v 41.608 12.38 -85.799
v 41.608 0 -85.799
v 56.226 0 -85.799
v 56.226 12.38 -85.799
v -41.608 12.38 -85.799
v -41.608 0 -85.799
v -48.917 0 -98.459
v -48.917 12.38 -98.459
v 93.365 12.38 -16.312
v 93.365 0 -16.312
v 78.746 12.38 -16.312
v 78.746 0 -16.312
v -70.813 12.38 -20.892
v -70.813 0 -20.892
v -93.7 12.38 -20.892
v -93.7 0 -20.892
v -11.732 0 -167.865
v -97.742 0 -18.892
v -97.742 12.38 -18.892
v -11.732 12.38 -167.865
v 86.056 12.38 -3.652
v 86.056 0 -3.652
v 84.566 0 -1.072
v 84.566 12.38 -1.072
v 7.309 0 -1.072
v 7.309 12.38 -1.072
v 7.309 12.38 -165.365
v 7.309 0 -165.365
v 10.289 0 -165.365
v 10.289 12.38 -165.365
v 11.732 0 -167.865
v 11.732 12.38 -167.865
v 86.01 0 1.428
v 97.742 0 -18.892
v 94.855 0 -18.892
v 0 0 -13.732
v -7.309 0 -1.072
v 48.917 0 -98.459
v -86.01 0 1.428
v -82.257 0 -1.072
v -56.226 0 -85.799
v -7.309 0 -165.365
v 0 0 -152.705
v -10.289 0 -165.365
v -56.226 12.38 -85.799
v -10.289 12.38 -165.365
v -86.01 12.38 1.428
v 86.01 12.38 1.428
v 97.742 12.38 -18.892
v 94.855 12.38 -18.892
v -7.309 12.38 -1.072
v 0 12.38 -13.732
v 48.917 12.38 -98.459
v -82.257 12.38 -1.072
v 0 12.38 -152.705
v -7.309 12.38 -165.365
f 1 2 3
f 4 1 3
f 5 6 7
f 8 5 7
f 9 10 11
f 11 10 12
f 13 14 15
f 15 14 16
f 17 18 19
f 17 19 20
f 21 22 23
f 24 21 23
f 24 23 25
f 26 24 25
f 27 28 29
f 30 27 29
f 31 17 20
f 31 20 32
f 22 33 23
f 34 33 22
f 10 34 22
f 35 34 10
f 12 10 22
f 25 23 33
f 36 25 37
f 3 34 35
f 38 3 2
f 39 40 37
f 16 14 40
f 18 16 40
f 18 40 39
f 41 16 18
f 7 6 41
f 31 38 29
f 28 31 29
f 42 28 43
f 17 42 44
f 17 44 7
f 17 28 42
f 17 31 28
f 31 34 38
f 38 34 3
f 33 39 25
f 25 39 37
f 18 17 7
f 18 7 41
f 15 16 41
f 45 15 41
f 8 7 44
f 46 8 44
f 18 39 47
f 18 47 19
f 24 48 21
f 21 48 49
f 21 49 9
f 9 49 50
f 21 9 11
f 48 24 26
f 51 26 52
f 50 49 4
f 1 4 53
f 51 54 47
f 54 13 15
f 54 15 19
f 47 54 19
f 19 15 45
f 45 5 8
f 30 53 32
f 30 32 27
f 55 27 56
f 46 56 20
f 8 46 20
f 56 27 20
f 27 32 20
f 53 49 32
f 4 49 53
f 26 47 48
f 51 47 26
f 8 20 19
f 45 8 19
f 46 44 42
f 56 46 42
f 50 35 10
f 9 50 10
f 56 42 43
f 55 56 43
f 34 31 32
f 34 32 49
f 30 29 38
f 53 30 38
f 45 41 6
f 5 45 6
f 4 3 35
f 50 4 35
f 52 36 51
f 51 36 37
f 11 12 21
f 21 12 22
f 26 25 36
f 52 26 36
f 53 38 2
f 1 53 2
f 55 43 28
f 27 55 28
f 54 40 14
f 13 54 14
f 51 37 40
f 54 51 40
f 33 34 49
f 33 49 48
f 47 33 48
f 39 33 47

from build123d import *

# Parameters (mm, degrees)
BOSS_EXTRUDE1_DEPTH = 12.38


with BuildPart() as part:
    # Sketch1 → Boss-Extrude1 (new body)
    with BuildSketch(Plane(origin=(0, 0, 0), x_dir=(1, 0, 0), z_dir=(0, 1, 0))):
        Polygon((-11.732050803, 167.865334802), (11.732050803, 167.865334802), (97.741669748, 18.89230485), (86.00961895, -1.428203229), (-86.009618944, -1.428203229), (-97.741669751, 18.892304845), align=None)
        Polygon((41.607695163, 85.798692796), (56.226497316, 85.798692796), (94.854918412, 18.892304841), (93.36528139, 16.312177834), (78.746479233, 16.312177834), (86.055880312, 3.651923793), (84.566243293, 1.071796793), (7.309401088, 1.071796793), (2e-09, 13.732050847), (-7.309401083, 1.071796796), (-82.256842179, 1.071796796), (-70.813466519, 20.892304849), (-93.70021784, 20.892304849), (-56.226497283, 85.798692801), (-41.60769513, 85.798692801), (-48.917096207, 98.458946839), (-10.288675112, 165.365334792), (-7.309401077, 165.365334792), (0, 152.705080754), (7.309401077, 165.365334792), (10.288675142, 165.365334792), (48.91709624, 98.458946834), align=None, mode=Mode.SUBTRACT)
    extrude(amount=BOSS_EXTRUDE1_DEPTH)


solid = part.part
